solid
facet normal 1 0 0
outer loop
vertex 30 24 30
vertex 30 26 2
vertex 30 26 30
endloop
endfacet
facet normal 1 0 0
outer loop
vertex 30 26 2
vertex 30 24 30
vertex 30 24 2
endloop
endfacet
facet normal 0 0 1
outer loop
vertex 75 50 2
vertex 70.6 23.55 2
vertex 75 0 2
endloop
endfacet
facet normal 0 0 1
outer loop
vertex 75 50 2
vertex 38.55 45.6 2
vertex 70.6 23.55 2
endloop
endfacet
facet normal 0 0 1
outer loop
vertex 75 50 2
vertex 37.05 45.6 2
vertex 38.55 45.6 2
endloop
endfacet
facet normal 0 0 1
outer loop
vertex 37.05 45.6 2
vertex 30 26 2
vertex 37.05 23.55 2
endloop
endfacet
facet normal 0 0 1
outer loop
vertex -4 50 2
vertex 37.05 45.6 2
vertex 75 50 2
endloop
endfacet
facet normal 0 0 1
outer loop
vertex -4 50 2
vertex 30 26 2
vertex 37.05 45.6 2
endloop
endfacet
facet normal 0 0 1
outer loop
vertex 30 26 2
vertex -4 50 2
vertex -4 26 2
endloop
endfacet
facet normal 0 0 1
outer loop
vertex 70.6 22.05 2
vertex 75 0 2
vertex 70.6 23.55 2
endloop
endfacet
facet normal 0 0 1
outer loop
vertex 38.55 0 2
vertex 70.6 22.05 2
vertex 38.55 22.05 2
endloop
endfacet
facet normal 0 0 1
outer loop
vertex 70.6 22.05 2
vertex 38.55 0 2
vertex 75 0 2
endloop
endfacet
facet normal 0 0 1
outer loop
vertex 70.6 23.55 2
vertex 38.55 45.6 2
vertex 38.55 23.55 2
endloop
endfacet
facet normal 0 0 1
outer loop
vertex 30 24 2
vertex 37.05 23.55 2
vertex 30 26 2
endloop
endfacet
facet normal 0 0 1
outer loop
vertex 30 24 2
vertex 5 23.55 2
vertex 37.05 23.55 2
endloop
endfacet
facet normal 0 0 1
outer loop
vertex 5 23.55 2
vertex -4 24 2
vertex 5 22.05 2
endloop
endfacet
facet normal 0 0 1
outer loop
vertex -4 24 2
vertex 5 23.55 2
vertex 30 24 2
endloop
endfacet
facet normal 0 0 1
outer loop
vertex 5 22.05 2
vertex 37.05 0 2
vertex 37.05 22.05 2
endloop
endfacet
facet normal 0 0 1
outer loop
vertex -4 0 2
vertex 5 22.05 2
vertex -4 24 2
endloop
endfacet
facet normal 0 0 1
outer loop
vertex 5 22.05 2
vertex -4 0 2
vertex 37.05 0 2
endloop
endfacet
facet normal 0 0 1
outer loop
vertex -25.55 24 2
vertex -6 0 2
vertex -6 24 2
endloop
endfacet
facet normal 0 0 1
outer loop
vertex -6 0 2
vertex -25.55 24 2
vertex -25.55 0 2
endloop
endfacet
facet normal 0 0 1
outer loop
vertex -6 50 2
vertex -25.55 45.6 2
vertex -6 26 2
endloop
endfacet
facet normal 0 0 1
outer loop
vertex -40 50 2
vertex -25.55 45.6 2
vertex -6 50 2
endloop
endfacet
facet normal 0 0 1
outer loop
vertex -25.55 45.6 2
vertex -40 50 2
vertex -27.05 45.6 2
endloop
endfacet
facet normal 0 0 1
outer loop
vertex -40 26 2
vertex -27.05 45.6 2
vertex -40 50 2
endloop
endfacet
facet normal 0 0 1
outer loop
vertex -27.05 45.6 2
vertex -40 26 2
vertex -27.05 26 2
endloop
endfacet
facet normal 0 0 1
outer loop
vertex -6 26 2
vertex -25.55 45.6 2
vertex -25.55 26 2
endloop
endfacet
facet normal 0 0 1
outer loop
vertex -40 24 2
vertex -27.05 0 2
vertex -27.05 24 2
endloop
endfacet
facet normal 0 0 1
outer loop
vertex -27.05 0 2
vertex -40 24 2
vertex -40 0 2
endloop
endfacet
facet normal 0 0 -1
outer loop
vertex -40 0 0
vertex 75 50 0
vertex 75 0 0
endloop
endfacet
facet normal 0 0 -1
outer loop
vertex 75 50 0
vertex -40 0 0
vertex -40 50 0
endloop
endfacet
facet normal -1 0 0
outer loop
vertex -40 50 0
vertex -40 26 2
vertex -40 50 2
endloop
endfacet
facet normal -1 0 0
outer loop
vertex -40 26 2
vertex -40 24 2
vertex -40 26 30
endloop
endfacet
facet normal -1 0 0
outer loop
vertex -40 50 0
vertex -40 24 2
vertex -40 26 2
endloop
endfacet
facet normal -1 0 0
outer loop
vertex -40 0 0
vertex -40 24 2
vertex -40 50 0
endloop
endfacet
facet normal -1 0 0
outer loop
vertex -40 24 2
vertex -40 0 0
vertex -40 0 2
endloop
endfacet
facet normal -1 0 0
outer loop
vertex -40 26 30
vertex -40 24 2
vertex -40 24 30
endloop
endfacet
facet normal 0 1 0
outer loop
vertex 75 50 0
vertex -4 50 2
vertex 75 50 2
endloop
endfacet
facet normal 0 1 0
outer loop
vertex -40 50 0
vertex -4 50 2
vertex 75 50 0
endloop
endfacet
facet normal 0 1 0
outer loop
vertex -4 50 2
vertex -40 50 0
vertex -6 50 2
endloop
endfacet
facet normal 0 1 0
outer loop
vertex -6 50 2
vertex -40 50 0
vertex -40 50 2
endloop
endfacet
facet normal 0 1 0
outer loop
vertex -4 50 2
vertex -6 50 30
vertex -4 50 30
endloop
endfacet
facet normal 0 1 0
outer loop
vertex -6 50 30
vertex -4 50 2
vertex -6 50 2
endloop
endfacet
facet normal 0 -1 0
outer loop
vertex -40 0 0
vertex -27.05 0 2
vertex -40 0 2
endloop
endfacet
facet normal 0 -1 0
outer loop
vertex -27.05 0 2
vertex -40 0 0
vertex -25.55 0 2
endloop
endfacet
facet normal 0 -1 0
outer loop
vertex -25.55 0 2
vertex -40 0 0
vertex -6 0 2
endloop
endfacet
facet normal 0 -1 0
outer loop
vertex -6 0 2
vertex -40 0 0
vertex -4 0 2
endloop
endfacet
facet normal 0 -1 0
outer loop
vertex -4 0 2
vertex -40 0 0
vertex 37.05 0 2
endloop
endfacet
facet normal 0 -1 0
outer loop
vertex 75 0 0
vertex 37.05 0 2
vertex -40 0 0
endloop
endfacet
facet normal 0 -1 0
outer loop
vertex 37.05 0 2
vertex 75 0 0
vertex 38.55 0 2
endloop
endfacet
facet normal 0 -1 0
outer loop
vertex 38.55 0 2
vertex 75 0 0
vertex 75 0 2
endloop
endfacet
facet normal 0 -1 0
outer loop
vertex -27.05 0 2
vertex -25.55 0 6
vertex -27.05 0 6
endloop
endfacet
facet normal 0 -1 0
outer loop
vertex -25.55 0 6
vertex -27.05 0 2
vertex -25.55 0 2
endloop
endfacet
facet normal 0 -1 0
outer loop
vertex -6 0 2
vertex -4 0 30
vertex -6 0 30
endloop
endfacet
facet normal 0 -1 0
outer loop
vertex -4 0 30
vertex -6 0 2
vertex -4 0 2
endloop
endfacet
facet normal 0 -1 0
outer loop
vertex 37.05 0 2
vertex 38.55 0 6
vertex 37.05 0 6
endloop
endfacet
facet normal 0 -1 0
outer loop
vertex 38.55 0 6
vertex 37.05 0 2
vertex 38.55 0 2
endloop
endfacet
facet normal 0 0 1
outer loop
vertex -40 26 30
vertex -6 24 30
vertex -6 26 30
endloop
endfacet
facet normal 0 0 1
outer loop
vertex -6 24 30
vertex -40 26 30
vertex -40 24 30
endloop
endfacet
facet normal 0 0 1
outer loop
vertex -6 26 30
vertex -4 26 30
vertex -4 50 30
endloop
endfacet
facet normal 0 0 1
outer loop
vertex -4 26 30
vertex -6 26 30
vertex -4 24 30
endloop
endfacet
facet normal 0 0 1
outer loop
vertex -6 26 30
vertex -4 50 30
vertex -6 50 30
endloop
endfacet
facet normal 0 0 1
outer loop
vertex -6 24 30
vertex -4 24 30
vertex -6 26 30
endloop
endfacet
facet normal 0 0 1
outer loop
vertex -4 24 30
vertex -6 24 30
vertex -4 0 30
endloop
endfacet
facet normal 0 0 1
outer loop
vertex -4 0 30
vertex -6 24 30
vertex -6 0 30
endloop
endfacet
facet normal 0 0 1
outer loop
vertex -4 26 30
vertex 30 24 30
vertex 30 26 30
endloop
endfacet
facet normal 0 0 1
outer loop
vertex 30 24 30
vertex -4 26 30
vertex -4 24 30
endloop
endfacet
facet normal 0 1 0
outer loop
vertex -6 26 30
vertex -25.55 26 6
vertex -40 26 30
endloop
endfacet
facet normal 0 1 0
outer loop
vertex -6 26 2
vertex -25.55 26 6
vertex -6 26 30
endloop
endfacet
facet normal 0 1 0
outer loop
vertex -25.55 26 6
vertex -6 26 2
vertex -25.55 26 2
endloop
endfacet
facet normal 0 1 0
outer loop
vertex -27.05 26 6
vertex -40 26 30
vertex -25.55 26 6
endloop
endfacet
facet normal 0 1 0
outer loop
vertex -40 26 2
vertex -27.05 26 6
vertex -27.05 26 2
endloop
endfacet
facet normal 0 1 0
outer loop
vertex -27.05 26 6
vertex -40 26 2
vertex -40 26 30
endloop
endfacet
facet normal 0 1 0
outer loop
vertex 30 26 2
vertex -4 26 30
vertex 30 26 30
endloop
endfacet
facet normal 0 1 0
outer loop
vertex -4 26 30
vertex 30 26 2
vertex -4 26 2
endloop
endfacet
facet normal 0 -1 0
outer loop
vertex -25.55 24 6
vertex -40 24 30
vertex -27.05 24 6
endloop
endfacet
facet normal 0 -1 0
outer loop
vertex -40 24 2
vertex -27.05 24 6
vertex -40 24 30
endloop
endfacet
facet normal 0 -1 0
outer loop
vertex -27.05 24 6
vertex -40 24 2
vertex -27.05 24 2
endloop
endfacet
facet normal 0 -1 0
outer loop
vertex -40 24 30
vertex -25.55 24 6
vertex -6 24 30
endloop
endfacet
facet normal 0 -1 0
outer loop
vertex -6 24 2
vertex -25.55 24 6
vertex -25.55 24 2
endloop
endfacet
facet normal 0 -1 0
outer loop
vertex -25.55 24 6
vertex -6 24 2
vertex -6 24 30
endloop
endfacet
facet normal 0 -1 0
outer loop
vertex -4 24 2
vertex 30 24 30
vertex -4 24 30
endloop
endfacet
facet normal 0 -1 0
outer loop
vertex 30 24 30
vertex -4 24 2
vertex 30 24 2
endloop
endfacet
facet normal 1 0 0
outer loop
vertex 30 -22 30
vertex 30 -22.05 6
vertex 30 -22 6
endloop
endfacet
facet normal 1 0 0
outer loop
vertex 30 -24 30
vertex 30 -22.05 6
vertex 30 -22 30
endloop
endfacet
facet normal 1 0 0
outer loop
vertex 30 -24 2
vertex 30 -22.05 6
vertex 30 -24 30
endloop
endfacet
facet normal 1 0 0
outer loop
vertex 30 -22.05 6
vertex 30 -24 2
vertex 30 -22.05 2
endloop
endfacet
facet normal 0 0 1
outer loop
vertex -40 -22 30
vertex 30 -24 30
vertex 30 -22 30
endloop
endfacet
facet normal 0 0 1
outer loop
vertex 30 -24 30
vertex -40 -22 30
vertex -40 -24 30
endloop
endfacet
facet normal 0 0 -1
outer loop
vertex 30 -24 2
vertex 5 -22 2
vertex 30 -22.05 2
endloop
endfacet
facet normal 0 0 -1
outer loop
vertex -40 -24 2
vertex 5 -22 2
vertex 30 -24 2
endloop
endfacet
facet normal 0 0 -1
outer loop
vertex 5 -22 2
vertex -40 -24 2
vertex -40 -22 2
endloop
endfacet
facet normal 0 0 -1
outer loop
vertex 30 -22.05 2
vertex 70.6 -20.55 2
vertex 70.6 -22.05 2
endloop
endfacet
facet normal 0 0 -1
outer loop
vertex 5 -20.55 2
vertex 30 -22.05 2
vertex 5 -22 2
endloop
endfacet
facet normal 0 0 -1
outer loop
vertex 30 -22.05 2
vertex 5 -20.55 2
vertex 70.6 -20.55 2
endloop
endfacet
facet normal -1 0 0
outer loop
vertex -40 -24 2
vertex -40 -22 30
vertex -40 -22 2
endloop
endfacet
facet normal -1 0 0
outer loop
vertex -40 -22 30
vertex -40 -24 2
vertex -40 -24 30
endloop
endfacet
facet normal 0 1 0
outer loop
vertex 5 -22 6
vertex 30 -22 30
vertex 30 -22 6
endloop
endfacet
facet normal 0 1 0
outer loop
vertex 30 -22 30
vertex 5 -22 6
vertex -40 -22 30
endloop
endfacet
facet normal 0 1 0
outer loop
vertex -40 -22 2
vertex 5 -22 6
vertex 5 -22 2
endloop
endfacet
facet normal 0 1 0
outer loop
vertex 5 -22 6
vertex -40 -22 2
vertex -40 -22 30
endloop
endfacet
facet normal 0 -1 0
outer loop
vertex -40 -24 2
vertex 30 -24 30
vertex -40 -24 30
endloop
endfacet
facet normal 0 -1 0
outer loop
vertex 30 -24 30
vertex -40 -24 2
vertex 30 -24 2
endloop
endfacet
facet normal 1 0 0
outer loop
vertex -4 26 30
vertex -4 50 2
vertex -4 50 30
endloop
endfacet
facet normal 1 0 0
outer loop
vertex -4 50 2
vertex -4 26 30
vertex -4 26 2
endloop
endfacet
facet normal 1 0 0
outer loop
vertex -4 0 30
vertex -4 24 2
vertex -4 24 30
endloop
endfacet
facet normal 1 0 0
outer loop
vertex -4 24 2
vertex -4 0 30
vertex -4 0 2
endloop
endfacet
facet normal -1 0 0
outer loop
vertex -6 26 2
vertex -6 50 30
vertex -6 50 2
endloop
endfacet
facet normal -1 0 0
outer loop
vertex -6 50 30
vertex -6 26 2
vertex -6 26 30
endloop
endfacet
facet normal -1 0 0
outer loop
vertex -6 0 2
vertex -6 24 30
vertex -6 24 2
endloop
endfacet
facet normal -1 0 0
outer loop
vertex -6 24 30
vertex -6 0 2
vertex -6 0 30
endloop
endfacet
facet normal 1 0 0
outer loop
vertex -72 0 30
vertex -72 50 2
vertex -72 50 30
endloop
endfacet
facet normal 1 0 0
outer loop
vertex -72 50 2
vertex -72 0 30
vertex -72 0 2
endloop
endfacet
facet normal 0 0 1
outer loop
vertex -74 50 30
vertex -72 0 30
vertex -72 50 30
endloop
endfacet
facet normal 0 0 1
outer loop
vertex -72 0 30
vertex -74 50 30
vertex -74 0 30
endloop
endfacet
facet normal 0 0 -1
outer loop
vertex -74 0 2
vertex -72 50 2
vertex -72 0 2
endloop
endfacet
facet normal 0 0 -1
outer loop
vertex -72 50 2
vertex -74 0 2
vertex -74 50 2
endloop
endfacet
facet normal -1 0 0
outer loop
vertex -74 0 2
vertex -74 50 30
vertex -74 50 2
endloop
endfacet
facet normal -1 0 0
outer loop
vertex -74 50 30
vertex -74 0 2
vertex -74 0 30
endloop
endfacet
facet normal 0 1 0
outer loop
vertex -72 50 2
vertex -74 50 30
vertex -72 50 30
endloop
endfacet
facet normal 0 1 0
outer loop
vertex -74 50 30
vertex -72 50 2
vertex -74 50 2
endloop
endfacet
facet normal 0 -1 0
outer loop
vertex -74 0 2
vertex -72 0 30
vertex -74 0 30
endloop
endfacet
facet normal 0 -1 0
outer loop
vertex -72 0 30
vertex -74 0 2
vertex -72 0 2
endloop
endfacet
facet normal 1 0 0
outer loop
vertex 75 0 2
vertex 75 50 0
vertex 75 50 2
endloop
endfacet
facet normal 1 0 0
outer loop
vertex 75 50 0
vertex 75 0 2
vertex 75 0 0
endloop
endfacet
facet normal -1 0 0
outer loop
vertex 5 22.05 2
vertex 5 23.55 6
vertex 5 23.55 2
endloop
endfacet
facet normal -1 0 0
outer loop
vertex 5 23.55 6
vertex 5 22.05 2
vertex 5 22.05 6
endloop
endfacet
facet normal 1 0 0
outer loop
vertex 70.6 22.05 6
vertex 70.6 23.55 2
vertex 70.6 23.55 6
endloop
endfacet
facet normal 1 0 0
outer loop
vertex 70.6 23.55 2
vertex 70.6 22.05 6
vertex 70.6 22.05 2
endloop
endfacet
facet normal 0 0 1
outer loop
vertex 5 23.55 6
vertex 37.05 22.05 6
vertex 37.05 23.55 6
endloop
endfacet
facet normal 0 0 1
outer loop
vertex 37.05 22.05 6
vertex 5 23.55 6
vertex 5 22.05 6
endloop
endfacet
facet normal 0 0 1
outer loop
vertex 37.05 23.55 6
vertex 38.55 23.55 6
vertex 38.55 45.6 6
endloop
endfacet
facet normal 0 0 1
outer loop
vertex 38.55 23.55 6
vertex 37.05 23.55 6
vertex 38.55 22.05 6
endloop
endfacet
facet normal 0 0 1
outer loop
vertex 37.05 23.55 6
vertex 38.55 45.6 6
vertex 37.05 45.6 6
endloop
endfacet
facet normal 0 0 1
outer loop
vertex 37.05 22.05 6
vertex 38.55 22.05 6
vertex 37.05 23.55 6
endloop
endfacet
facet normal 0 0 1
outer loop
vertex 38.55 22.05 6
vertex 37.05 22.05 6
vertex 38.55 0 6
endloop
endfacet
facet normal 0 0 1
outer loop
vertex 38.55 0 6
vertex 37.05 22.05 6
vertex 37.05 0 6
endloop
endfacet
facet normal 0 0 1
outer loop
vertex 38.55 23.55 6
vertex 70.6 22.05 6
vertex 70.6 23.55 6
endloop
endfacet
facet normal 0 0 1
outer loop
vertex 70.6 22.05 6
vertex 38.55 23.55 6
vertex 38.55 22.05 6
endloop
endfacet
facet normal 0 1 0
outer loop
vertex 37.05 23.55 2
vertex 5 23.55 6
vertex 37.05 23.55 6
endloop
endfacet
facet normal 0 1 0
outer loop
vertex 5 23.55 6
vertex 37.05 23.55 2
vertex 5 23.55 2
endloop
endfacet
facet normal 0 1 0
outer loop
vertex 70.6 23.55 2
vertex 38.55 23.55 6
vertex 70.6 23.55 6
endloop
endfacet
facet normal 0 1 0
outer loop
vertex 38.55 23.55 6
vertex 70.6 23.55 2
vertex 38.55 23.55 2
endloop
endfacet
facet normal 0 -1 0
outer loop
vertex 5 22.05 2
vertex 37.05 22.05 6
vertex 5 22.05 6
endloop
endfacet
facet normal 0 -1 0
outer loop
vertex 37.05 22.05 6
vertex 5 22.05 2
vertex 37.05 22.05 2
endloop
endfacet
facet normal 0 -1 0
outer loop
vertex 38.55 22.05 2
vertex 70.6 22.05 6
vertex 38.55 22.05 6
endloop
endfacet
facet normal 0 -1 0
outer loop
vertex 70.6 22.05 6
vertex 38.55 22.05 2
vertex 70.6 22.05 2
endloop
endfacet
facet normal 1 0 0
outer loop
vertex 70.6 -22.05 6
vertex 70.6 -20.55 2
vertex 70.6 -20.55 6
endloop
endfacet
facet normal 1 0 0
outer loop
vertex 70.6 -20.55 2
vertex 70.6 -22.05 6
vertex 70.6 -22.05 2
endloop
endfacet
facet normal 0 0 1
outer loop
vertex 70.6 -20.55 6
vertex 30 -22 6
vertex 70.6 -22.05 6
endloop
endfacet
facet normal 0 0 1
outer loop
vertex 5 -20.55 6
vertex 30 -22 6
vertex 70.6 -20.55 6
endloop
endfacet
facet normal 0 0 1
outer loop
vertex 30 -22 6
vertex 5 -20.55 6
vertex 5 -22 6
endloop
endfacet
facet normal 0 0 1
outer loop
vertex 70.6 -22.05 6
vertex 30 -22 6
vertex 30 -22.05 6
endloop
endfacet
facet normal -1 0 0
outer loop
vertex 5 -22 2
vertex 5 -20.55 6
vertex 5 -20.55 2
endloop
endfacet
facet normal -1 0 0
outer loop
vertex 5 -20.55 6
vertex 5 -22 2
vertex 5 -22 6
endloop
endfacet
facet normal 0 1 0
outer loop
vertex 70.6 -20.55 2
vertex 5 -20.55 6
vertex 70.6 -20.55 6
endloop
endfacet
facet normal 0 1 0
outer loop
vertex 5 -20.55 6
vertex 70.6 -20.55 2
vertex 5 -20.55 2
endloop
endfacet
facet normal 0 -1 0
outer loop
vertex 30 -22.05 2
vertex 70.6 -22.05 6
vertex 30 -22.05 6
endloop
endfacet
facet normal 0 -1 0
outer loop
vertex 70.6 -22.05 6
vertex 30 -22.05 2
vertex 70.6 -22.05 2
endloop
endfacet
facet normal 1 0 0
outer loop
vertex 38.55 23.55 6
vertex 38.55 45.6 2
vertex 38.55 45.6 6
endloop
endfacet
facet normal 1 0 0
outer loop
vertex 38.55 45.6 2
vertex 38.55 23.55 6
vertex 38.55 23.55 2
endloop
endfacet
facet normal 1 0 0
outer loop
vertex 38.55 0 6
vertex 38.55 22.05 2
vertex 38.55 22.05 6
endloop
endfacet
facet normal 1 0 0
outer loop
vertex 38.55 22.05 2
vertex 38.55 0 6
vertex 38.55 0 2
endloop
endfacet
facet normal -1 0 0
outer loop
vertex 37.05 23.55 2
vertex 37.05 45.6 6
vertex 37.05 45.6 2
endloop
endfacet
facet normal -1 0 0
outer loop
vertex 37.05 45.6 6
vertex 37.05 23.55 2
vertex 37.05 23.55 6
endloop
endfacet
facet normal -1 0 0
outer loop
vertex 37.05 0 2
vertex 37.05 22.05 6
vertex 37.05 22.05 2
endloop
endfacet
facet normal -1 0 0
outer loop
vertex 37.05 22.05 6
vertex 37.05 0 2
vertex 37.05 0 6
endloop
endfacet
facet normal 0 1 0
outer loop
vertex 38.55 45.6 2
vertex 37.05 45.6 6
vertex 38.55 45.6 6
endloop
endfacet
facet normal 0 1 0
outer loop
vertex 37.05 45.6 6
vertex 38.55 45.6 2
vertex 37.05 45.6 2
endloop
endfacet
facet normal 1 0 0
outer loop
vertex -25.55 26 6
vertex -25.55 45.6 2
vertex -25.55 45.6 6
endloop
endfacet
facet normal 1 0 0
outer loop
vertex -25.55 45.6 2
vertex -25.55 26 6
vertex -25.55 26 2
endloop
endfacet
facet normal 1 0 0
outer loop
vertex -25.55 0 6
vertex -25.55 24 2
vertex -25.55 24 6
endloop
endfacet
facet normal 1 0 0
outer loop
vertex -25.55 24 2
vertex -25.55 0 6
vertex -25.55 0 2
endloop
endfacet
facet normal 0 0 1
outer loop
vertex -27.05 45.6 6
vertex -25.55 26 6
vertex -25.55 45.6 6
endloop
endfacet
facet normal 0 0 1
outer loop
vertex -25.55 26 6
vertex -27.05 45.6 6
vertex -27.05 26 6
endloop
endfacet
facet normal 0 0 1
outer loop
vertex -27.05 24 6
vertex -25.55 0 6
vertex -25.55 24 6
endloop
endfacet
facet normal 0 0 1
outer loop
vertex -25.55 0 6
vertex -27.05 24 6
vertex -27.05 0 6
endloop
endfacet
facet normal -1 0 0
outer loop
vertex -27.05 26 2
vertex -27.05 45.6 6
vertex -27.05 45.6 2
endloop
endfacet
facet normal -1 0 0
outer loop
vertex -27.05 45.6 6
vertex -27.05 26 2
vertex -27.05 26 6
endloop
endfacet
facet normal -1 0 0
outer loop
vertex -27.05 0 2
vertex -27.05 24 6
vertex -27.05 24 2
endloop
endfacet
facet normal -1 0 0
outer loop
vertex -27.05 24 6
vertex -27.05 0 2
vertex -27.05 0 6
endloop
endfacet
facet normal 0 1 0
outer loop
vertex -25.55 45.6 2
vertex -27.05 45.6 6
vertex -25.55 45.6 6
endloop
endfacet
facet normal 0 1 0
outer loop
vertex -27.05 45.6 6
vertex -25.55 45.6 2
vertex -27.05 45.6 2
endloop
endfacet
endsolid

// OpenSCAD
// Units: millimetres
// $fn = 64; // Default for curved shapes, but we use it explicitly where needed

// --- Part 1: Box ---
// Outer dimensions
box_outer_x = 70;
box_outer_y = 50;
box_outer_z = 30;

// Wall and floor thickness
box_wall_thick = 2;
box_floor_thick = 2;

// Clearance for lid (0.2mm per side)
box_clearance = 0.2;

// Inner dimensions calculated from outer
box_inner_x = box_outer_x - 2 * box_wall_thick;
box_inner_y = box_outer_y - 2 * box_wall_thick;
box_inner_z = box_outer_z - box_floor_thick; // Open top, so height is floor thickness

// Position for Part 1 (Box)
// Centered on X, Y=0, Z=0.
// We will place it at x = - (box_outer_x/2 + 5) to leave 10mm gap with Part 2
box_pos_x = - (box_outer_x / 2 + 5);
box_pos_y = 0;
box_pos_z = 0;

// --- Part 2: Lid ---
// Plate dimensions (base)
lid_plate_x = 70;
lid_plate_y = 50;
lid_plate_z = 2;

// Lip dimensions
lip_wall_thick = 1.5;
lip_height = 4;
lip_outer_x = 65.6;
lip_outer_y = 45.6;

// Position for Part 2 (Lid)
// Placed on +X side of box with 10mm gap.
// Box right edge is at box_pos_x + box_outer_x/2.
// Gap is 10mm.
lid_pos_x = box_pos_x + box_outer_x/2 + 10;
lid_pos_y = 0;
lid_pos_z = 0;

// --- Construction ---

module box_part() {
    // Base plate (floor)
    translate([box_pos_x, box_pos_y, box_pos_z])
        cube([box_outer_x, box_outer_y, box_floor_thick]);

    // Walls (4 walls)
    // Front wall (Y positive)
    translate([box_pos_x, box_pos_y + box_outer_y/2 - box_wall_thick/2, box_floor_thick])
        cube([box_outer_x, box_wall_thick, box_outer_z - box_floor_thick]);
    
    // Back wall (Y negative)
    translate([box_pos_x, box_pos_y - box_outer_y/2 + box_wall_thick/2, box_floor_thick])
        cube([box_outer_x, box_wall_thick, box_outer_z - box_floor_thick]);
    
    // Left wall (X negative)
    translate([box_pos_x + box_outer_x/2 - box_wall_thick/2, box_pos_y, box_floor_thick])
        cube([box_wall_thick, box_outer_y, box_outer_z - box_floor_thick]);
    
    // Right wall (X positive)
    translate([box_pos_x - box_outer_x/2 + box_wall_thick/2, box_pos_y, box_floor_thick])
        cube([box_wall_thick, box_outer_y, box_outer_z - box_floor_thick]);
}

module lid_part() {
    // Base plate
    translate([lid_pos_x, lid_pos_y, lid_pos_z])
        cube([lid_plate_x, lid_plate_y, lid_plate_z]);

    // Lip (Rectangular wall)
    // The lip is centered on the plate.
    // We create a hollow box for the lip and subtract it from the plate? 
    // No, the lip is a wall on top. We can model it as a hollow box sitting on the plate.
    // To ensure it's a solid part, we can use a difference or just build the walls.
    // Let's build the walls explicitly to avoid coplanar issues with the plate.
    
    // We need to subtract the inner volume from the plate to create the lip walls?
    // Actually, the prompt says "a rectangular lip on top of it".
    // Best approach: Create the plate, then create the lip walls as separate cubes and union them.
    // But the lip is a "wall" 1.5mm thick.
    // Let's model the lip as a hollow box (outer 65.6 x 45.6 x 4) and subtract the inner void from the plate?
    // No, the plate is 2mm thick. The lip sits on top.
    // Let's create the lip as a hollow box and subtract the inner part from the plate?
    // Actually, simpler: Create the plate. Then create the lip walls as 4 separate cubes.
    
    // Lip outer dimensions
    lip_x = lip_outer_x;
    lip_y = lip_outer_y;
    lip_z = lip_height;
    
    // Center the lip on the plate
    lip_center_x = lid_pos_x;
    lip_center_y = lid_pos_y;
    lip_base_z = lid_pos_z + lid_plate_z;

    // Front wall (Y positive)
    translate([lip_center_x, lip_center_y + lip_y/2 - lip_wall_thick/2, lip_base_z])
        cube([lip_x, lip_wall_thick, lip_z]);
        
    // Back wall (Y negative)
    translate([lip_center_x, lip_center_y - lip_y/2 + lip_wall_thick/2, lip_base_z])
        cube([lip_x, lip_wall_thick, lip_z]);
        
    // Left wall (X negative)
    translate([lip_center_x + lip_x/2 - lip_wall_thick/2, lip_center_y, lip_base_z])
        cube([lip_wall_thick, lip_y, lip_z]);
        
    // Right wall (X positive)
    translate([lip_center_x - lip_x/2 + lip_wall_thick/2, lip_center_y, lip_base_z])
        cube([lip_wall_thick, lip_y, lip_z]);
}

// Combine both parts
union() {
    box_part();
    lid_part();
}
